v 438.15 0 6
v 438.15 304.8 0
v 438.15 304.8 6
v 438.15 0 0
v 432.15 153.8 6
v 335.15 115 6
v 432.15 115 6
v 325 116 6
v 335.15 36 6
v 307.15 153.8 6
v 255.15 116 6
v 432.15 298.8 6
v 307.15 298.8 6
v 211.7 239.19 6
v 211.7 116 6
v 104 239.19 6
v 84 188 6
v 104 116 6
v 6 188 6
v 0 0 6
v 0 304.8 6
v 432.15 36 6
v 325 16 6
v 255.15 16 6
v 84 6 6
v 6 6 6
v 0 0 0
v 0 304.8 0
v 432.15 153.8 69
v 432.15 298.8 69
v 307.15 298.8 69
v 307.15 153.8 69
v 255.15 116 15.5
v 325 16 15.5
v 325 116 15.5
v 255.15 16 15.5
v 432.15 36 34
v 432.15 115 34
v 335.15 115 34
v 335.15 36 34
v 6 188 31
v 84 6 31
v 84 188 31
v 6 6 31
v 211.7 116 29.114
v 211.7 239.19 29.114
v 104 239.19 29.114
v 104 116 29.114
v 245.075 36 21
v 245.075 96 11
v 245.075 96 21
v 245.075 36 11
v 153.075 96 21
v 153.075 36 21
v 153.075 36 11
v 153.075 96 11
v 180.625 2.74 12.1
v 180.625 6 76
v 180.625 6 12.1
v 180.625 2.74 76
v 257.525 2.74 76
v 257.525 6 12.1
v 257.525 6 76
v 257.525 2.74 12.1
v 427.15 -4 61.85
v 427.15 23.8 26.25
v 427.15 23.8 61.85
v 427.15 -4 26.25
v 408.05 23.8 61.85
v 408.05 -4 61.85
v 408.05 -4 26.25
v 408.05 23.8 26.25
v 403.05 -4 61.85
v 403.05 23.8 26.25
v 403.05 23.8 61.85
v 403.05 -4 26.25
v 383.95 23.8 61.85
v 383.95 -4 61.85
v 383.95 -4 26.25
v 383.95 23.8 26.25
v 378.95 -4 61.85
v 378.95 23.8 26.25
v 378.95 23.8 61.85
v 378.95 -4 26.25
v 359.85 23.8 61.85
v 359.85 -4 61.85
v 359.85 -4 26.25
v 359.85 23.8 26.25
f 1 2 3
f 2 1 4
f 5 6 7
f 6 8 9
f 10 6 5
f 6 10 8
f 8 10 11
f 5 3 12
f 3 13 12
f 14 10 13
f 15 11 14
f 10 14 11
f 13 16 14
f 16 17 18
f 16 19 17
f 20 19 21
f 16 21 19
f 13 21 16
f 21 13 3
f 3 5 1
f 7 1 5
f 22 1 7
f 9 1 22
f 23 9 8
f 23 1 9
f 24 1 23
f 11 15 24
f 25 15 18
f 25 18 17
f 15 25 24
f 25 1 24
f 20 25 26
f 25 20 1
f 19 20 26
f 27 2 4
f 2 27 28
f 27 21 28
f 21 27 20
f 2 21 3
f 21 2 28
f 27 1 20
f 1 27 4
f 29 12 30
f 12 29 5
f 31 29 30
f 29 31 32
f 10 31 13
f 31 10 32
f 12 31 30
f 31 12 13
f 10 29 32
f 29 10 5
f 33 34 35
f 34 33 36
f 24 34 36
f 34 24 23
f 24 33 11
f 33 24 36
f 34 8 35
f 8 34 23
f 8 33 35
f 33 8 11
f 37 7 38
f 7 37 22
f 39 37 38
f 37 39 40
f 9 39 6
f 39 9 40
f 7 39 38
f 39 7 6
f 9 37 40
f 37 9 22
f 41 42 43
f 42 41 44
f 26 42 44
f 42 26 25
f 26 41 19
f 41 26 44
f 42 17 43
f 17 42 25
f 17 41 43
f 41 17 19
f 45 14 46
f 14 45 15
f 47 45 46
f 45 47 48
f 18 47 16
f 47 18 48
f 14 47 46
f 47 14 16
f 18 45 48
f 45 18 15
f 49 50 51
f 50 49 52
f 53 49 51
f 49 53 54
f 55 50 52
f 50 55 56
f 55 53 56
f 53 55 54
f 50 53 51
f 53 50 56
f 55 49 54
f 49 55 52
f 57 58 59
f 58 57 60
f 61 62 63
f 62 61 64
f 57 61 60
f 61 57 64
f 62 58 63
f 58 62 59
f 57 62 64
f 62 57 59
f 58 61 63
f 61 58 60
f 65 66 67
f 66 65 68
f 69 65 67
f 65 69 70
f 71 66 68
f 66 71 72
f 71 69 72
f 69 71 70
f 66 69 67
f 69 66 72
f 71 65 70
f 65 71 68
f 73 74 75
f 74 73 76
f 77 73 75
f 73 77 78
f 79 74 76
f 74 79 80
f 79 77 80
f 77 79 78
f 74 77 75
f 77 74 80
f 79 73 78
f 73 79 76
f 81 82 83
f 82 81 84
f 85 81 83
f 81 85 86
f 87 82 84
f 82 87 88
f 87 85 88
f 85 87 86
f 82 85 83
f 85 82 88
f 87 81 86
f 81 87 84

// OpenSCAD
//Global case size variables
acrylic=6;
case_width=438.15;//17.25" rack unit width
case_height=88.1;//2U rack height
case_depth=304.8;//1/2 24" rack depth

//Case panels: naive approximations for now
front_panel_height=case_height-2*acrylic;
module front_panel(){
	cube([case_width,front_panel_height,acrylic]);
}

module back_panel(){
	cube([case_width,case_height,acrylic]);
}

module top_panel(){
	cube([case_width, case_depth, acrylic]);
}

module bottom_panel(){
	cube([case_width, case_depth, acrylic]);
}

module side_panel(){
	cube([case_depth,case_height,acrylic]);	
}

// Parts inside the case
// Global variables. Nice and dirty!
psu_width=125;
psu_height=63;
psu_depth=145;

module psu(){
	cube([psu_width,psu_depth,psu_height]);
}

module ssd_25_inch(){
	//9.5mm is most common
	cube([100,69.85,9.5]);
}

ethernet_switch_width=97;
ethernet_switch_depth=79;
ethernet_switch_height=28;
module ethernet_switch(){
	cube([ethernet_switch_width,ethernet_switch_depth,ethernet_switch_height]);
}

module vga_splitter(){
	//approximation
	cube([66,61,23]);
}

vga_hdmi_converter_width=182;
vga_hdmi_converter_depth=78;
vga_hdmi_converter_height=25;
module vga_hdmi_converter(){
	cube([vga_hdmi_converter_width,vga_hdmi_converter_depth,vga_hdmi_converter_height]);
}

module h264_encoder(){
	cube([107.70,123.19,23.114]);
}

banana_pi_width=92;
banana_pi_depth=60;
banana_pi_height=10;// just a wild guess for now
module banana_pi(){
	cube([banana_pi_width,banana_pi_depth,banana_pi_height]);
}

lcd_width=76.9;
lcd_height=63.9;
lcd_depth=3.26;
module banana_pi_lcd(){
	cube([lcd_width,lcd_height,lcd_depth]);//non-touch
	//cube([76.9,65.3,3.26]);//touch
}

ethernet_coupler_width=19.1;
ethernet_coupler_height=35.6;
ethernet_coupler_depth=27.8;
module ethernet_coupler(){
	//just an example from http://www.l-com.com/multimedia/eng_drawings/ECF504-C5.pdf
	cube([19.1,27.8,35.6]);
}

color("black") bottom_panel();
% translate([0,0,case_height-acrylic]) top_panel();
color("red") translate([case_width-psu_width-acrylic,case_depth-psu_depth-acrylic,acrylic]) psu();
% translate([0,acrylic,acrylic]) rotate([90,0,0]) front_panel();
color("green") translate([325,acrylic+10,0]) rotate([0,0,90]) translate([0,0,acrylic]) ssd_25_inch();
translate([case_width-ethernet_switch_width-acrylic,acrylic+30,acrylic]) color("red") ethernet_switch();
//color("red") vga_splitter();
color("pink") translate([vga_hdmi_converter_depth+acrylic,acrylic,acrylic]) rotate([0,0,90]) vga_hdmi_converter();
color("purple") translate([acrylic+vga_hdmi_converter_depth+20,acrylic+110,acrylic]) h264_encoder();
color("yellow") translate([(case_width-banana_pi_width)/2-20, acrylic+30, acrylic+5])banana_pi();
color("blue") translate([(case_width-lcd_width)/2,acrylic,acrylic+(front_panel_height-lcd_height)/2]) rotate([90,0,0]) banana_pi_lcd();
color("red") translate([case_width-acrylic -(ethernet_coupler_width+5),-4,acrylic+(front_panel_height-ethernet_coupler_height)/2]) ethernet_coupler();
color("red") translate([case_width- acrylic - 2*(ethernet_coupler_width+5),-4,acrylic+(front_panel_height-ethernet_coupler_height)/2]) ethernet_coupler();
color("red") translate([case_width- acrylic - 3*(ethernet_coupler_width+5),-4,acrylic+(front_panel_height-ethernet_coupler_height)/2]) ethernet_coupler();
